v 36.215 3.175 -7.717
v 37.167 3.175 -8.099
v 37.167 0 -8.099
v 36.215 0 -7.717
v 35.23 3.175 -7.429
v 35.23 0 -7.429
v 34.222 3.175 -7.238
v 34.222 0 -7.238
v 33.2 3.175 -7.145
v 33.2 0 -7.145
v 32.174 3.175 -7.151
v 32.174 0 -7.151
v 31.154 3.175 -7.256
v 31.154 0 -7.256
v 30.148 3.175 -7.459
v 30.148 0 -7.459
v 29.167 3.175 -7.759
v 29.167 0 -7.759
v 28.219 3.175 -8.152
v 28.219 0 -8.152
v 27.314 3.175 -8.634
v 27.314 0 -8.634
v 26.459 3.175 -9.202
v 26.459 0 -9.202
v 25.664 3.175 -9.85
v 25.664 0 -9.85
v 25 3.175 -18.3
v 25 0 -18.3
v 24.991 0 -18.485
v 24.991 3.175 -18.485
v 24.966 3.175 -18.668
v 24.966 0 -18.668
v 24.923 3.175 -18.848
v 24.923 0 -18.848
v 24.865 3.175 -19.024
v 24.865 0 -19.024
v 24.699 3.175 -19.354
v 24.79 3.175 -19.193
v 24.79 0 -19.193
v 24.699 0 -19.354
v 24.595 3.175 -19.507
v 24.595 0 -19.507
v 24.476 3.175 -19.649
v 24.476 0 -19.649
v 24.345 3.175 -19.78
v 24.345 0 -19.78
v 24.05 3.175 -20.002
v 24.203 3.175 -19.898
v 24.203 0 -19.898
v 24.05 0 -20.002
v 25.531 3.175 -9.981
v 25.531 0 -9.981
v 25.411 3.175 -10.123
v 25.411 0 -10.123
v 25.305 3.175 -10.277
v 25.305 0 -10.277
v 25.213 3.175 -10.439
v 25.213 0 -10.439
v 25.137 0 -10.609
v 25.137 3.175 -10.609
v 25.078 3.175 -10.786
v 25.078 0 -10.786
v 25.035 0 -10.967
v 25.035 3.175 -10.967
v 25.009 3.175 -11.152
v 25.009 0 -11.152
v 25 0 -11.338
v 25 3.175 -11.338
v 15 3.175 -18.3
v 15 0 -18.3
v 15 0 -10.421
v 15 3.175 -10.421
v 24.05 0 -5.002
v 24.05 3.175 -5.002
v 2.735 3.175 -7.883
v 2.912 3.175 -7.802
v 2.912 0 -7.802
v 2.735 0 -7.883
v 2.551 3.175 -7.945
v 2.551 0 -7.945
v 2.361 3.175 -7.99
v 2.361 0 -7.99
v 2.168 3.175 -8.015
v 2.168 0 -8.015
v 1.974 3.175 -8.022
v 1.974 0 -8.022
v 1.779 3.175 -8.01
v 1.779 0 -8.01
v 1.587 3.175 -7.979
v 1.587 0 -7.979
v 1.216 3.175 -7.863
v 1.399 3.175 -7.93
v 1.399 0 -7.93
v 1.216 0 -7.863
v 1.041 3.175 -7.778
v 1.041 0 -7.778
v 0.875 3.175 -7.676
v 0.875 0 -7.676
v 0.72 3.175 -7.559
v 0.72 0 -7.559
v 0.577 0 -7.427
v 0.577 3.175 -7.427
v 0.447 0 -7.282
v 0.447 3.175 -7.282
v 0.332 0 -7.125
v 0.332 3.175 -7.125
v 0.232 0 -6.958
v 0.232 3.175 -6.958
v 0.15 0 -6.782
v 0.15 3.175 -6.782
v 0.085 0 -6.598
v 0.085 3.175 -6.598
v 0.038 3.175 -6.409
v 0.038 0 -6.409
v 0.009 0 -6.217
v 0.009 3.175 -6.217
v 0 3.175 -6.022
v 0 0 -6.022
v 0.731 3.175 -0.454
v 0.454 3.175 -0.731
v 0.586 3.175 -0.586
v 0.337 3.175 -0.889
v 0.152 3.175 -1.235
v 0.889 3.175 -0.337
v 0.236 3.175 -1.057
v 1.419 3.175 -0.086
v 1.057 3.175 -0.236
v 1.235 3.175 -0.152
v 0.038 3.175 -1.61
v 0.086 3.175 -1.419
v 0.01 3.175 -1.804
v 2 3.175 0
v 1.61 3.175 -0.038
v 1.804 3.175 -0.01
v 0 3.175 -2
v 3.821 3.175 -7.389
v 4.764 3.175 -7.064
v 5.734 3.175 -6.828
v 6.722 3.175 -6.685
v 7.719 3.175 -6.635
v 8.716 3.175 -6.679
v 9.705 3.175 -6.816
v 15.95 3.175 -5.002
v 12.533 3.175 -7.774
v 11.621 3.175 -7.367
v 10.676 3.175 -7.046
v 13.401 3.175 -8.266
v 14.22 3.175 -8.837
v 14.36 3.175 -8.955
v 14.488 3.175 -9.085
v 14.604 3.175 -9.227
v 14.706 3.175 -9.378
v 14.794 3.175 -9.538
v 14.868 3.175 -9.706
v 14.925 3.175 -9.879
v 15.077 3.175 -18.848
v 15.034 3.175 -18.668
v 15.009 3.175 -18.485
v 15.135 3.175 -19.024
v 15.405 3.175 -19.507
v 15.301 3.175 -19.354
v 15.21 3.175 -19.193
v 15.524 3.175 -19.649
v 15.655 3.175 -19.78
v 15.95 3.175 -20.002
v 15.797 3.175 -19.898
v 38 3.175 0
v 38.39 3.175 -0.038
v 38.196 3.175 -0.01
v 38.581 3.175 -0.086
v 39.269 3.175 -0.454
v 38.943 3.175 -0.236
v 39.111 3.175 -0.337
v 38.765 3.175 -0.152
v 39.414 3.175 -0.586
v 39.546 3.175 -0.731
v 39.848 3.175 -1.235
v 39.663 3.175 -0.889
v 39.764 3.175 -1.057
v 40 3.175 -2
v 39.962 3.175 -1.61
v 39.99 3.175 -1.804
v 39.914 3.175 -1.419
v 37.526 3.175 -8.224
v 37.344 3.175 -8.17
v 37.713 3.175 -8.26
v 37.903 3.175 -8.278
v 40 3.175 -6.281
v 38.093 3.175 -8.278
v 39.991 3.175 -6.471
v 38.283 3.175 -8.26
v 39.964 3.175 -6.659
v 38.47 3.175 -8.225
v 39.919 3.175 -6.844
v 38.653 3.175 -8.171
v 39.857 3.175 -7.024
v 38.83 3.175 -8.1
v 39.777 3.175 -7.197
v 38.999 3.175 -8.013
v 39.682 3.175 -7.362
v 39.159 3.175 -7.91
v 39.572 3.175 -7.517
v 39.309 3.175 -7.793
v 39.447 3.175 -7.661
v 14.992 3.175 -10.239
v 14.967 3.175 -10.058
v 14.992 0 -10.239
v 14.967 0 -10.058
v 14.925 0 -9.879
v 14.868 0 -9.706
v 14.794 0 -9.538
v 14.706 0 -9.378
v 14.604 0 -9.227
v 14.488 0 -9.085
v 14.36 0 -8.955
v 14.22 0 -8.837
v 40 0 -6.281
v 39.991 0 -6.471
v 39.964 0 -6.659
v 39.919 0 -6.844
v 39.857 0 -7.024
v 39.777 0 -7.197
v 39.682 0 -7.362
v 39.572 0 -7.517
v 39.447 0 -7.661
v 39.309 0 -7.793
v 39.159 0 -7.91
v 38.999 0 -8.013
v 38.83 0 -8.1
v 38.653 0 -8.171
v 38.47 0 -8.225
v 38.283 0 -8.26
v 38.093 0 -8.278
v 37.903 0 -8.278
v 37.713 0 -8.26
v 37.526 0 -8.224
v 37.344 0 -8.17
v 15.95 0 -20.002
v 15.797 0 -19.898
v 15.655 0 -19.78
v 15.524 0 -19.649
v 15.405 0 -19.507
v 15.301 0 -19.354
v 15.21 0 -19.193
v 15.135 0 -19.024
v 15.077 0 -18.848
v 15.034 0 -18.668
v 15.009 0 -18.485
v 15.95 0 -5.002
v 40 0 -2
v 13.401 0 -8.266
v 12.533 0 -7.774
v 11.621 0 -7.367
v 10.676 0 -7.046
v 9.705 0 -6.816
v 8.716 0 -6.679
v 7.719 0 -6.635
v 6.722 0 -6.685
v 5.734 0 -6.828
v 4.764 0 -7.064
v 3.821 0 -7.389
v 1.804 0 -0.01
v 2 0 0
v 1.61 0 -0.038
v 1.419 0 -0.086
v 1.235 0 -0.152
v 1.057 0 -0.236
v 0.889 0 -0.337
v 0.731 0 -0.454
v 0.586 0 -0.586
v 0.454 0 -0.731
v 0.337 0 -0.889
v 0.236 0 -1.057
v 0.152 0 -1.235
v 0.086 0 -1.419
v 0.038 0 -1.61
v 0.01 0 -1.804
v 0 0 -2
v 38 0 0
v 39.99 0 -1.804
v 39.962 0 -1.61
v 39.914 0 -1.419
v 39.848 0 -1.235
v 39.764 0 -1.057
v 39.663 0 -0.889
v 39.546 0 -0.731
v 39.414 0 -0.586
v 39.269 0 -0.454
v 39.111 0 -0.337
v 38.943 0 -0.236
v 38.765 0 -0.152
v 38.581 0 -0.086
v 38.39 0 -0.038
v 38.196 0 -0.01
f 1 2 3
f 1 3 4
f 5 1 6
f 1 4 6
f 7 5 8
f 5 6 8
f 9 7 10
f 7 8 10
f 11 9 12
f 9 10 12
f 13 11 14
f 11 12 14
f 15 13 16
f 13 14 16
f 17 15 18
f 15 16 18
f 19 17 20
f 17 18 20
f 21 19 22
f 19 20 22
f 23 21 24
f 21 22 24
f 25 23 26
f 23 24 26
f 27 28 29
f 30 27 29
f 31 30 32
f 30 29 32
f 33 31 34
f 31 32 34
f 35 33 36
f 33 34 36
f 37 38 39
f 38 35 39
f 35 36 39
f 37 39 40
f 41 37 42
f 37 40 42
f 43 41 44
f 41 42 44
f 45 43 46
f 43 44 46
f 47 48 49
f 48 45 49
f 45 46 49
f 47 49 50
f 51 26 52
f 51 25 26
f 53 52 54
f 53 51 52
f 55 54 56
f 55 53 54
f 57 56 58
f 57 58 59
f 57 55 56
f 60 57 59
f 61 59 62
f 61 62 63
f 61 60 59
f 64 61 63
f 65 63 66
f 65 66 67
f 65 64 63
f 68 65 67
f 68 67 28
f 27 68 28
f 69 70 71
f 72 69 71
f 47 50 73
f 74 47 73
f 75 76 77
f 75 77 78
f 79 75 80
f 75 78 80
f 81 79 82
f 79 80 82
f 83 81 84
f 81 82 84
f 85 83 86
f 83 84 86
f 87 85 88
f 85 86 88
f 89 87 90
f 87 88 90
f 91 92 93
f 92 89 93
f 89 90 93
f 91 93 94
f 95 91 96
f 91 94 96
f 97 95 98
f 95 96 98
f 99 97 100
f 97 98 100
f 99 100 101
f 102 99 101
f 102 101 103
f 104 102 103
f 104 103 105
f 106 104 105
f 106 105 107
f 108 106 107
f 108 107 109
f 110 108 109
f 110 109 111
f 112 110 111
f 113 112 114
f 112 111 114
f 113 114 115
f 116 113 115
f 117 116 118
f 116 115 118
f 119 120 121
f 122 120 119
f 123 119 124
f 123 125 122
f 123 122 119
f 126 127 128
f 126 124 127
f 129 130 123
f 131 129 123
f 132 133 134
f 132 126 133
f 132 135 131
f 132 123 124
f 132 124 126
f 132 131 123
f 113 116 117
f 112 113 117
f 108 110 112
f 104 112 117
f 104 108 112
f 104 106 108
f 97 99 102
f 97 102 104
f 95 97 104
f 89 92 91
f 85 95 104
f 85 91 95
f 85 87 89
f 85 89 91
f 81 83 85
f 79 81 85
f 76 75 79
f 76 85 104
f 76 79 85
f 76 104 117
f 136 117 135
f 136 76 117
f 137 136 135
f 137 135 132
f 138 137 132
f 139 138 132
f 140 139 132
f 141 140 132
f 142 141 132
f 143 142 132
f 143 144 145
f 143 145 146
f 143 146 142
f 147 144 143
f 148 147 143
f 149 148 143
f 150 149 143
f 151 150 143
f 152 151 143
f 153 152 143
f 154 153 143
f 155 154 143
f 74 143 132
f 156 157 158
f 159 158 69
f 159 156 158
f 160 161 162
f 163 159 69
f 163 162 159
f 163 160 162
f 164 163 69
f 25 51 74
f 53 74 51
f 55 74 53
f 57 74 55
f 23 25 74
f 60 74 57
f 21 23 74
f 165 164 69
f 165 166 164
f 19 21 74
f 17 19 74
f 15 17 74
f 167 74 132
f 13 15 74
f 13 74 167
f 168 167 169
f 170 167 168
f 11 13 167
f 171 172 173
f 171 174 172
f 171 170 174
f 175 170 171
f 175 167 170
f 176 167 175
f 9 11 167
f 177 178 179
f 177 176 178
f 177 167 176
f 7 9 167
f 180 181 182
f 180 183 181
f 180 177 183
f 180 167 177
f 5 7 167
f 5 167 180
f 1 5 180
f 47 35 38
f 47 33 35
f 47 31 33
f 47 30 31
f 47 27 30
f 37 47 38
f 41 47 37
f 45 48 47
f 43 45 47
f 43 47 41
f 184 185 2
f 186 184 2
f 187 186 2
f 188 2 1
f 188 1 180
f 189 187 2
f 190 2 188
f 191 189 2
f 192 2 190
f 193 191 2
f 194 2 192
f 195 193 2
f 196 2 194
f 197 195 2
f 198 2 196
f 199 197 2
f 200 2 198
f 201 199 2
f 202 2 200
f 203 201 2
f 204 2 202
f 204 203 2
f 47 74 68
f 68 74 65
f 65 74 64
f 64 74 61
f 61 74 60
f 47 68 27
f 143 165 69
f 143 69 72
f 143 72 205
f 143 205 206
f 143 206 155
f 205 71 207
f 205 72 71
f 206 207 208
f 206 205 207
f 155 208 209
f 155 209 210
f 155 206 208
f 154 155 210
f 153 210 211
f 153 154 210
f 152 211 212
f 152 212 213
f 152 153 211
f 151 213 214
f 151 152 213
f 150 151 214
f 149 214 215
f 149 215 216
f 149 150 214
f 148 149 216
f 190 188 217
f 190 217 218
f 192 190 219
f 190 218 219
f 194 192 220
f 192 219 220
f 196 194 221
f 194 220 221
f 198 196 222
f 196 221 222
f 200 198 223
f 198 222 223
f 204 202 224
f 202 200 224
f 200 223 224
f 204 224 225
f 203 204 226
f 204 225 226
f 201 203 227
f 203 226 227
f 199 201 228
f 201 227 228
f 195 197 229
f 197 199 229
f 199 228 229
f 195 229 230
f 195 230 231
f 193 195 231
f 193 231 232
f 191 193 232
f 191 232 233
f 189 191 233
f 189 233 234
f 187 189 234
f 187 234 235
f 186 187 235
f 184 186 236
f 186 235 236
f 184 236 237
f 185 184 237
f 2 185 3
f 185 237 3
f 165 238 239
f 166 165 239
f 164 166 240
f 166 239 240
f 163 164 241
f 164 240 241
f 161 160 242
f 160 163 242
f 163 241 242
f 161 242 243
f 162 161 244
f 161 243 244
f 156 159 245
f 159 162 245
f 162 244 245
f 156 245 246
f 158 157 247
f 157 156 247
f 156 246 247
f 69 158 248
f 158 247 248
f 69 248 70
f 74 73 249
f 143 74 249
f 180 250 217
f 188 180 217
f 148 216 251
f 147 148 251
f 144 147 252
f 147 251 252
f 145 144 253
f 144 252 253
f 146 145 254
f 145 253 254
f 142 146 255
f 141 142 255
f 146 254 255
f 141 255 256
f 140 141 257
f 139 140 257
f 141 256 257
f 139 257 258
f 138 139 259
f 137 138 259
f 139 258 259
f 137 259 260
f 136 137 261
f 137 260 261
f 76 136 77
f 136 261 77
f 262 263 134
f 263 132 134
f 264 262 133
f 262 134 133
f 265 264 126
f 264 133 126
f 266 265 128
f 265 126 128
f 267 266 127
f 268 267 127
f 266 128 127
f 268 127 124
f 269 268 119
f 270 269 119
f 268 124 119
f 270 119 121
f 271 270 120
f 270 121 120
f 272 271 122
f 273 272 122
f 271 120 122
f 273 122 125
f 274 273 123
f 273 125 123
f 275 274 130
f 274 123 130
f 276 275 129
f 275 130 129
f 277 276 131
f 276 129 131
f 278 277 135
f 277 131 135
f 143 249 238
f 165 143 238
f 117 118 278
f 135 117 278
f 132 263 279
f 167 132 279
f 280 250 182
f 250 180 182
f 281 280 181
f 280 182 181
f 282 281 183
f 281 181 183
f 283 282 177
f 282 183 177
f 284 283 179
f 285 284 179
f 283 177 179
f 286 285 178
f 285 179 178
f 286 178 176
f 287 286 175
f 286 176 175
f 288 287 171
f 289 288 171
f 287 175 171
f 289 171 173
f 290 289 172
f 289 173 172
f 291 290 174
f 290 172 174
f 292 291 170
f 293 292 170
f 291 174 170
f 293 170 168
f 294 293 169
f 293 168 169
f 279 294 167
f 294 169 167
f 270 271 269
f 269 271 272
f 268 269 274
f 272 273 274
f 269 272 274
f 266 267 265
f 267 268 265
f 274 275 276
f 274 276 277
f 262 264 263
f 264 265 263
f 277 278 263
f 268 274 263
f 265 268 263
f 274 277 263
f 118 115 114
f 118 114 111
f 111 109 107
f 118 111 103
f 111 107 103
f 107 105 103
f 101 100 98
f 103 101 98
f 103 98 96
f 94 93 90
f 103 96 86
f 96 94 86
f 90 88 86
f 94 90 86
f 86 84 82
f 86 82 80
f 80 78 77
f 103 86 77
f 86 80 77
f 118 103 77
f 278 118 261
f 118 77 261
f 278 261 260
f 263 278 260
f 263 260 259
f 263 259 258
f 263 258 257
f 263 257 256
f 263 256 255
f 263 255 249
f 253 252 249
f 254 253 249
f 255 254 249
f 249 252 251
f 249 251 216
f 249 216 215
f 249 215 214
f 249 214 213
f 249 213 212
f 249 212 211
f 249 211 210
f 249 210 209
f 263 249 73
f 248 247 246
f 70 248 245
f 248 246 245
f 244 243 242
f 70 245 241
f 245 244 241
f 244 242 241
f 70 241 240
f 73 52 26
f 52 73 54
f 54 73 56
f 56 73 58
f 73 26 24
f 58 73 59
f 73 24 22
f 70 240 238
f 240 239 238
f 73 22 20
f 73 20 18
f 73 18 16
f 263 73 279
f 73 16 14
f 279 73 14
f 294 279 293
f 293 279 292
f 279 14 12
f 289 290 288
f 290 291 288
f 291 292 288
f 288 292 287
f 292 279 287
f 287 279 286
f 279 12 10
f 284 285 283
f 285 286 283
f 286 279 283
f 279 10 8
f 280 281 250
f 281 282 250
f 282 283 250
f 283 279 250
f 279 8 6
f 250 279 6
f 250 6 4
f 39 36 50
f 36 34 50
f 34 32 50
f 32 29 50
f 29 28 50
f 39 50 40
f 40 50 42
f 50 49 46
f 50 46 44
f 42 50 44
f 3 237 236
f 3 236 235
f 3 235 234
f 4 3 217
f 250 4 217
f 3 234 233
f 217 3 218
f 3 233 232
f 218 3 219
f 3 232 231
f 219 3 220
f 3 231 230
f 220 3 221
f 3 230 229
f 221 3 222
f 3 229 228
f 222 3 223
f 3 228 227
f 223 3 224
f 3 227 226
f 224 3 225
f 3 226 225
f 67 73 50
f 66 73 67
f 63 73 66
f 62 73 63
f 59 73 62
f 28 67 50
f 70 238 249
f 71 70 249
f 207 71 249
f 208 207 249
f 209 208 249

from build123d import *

# Parameters (mm, degrees)
BOSS_EXTRUDE1_DEPTH = 3.175
FILLET1_R           = 2
FILLET2_R           = 2
FILLET3_R           = 2


with BuildPart() as part:
    # Sketch2 → Boss-Extrude1 (new body)
    with BuildSketch(Plane(origin=(0, 0, 0), x_dir=(1, 0, 0), z_dir=(0, 1, 0))):
        with BuildLine():
            Line((0, 0), (40, 0))
            Line((40, 0), (40, 10))
            ThreePointArc((40, 10), (32.396249588, 7.141230333), (25, 10.500557105))
            Line((25, 10.500557105), (25, 20.002146828))
            Line((25, 20.002146828), (24.05, 20.002146828))
            Line((24.05, 20.002146828), (24.05, 5.002146828))
            Line((24.05, 5.002146828), (15.95, 5.002146828))
            Line((15.95, 5.002146828), (15.95, 20.002146828))
            Line((15.95, 20.002146828), (15, 20.002146828))
            Line((15, 20.002146828), (15, 9.499442895))
            ThreePointArc((15, 9.499442895), (7.396249588, 6.640673228), (0, 10))
            Line((0, 10), (0, 0))
        make_face()
    extrude(amount=BOSS_EXTRUDE1_DEPTH)

    # Fillet1
    fillet1_edges = [part.edges().sort_by_distance(p)[0] for p in [
        (15, 1.5875, -9.499442895),
        (25, 1.5875, -10.500557105),
    ]]
    fillet(fillet1_edges, radius=FILLET1_R)

    # Fillet2
    # the kernel refuses this fillet: 2 mm, written as the material it takes off along each edge
    with BuildSketch(Plane(origin=(25, -4.255511133, -20.002146828), x_dir=(0, 0, 1), z_dir=(0, 1, 0))) as fillet2_piece_1:
        with BuildLine():
            CenterArc((1.702204453, -2), FILLET2_R, 90, 58.331756746)
            Line((0, -0.95), (-0.034044089, -0.929))
            ThreePointArc((-0.034044089, -0.929), (-0.04, -0.475), (-0.04, 0))
            Line((-0.04, 0), (0, 0.04))
            Line((0, 0.04), (1.702204453, 0.04))
            Line((1.702204453, 0.04), (1.702204453, 0))
        make_face()
    extrude(amount=11.686022265, mode=Mode.SUBTRACT)
    with BuildSketch(Plane(origin=(15, -4.255511133, -20.002146828), x_dir=(0, 0, 1), z_dir=(0, 1, 0))) as fillet2_piece_2:
        with BuildLine():
            CenterArc((1.702204453, 2), FILLET2_R, 211.668243254, 58.331756746)
            Line((0, 0.95), (-0.034044089, 0.929))
            ThreePointArc((-0.034044089, 0.929), (-0.04, 0.475), (-0.04, 0))
            Line((-0.04, 0), (0, -0.04))
            Line((0, -0.04), (1.702204453, -0.04))
            Line((1.702204453, -0.04), (1.702204453, 0))
        make_face()
    extrude(amount=11.686022265, mode=Mode.SUBTRACT)
    with BuildSketch(Plane(origin=(0, -9.943835684, -10), x_dir=(0, 0, 1), z_dir=(0, 1, 0))) as fillet2_piece_3:
        with BuildLine():
            CenterArc((3.977534274, 2), FILLET2_R, 152.863608887, 117.136391113)
            Line((2.197687698, 2.912220459), (2.162090766, 2.930464868))
            ThreePointArc((2.162090766, 2.930464868), (1.193071422, 1.385002021), (-0.027308932, 0.02922708))
            Line((-0.027308932, 0.02922708), (0, -0.04))
            Line((0, -0.04), (3.977534274, -0.04))
            Line((3.977534274, -0.04), (3.977534274, 0))
        make_face()
    extrude(amount=23.062671369, mode=Mode.SUBTRACT)
    with BuildSketch(Plane(origin=(40, -9.298695448, -10), x_dir=(-0.8303470474110474, 0, 0.5572466068588987), z_dir=(0, 1, 0))) as fillet2_piece_4:
        with BuildLine():
            CenterArc((3.733360689, 1.97396451), FILLET2_R, 146.134404681, 114.610566722)
            Line((2.072666595, 3.088457724), (2.039452713, 3.110747588))
            Line((2.039452713, 3.110747588), (-0.033213882, 0.022289864))
            Line((-0.033213882, 0.022289864), (0.006433168, -0.03947929))
            ThreePointArc((0.006433168, -0.03947929), (1.705851155, 0.098074035), (3.405269143, -0.03947929))
            Line((3.405269143, -0.03947929), (3.411702311, 0))
        make_face()
    extrude(amount=21.772390895, mode=Mode.SUBTRACT)

    # Fillet3
    fillet3_edges = [part.edges().sort_by_distance(p)[0] for p in [
        (40, 1.5875, 0),
        (0, 1.5875, 0),
    ]]
    fillet(fillet3_edges, radius=FILLET3_R)


solid = part.part
